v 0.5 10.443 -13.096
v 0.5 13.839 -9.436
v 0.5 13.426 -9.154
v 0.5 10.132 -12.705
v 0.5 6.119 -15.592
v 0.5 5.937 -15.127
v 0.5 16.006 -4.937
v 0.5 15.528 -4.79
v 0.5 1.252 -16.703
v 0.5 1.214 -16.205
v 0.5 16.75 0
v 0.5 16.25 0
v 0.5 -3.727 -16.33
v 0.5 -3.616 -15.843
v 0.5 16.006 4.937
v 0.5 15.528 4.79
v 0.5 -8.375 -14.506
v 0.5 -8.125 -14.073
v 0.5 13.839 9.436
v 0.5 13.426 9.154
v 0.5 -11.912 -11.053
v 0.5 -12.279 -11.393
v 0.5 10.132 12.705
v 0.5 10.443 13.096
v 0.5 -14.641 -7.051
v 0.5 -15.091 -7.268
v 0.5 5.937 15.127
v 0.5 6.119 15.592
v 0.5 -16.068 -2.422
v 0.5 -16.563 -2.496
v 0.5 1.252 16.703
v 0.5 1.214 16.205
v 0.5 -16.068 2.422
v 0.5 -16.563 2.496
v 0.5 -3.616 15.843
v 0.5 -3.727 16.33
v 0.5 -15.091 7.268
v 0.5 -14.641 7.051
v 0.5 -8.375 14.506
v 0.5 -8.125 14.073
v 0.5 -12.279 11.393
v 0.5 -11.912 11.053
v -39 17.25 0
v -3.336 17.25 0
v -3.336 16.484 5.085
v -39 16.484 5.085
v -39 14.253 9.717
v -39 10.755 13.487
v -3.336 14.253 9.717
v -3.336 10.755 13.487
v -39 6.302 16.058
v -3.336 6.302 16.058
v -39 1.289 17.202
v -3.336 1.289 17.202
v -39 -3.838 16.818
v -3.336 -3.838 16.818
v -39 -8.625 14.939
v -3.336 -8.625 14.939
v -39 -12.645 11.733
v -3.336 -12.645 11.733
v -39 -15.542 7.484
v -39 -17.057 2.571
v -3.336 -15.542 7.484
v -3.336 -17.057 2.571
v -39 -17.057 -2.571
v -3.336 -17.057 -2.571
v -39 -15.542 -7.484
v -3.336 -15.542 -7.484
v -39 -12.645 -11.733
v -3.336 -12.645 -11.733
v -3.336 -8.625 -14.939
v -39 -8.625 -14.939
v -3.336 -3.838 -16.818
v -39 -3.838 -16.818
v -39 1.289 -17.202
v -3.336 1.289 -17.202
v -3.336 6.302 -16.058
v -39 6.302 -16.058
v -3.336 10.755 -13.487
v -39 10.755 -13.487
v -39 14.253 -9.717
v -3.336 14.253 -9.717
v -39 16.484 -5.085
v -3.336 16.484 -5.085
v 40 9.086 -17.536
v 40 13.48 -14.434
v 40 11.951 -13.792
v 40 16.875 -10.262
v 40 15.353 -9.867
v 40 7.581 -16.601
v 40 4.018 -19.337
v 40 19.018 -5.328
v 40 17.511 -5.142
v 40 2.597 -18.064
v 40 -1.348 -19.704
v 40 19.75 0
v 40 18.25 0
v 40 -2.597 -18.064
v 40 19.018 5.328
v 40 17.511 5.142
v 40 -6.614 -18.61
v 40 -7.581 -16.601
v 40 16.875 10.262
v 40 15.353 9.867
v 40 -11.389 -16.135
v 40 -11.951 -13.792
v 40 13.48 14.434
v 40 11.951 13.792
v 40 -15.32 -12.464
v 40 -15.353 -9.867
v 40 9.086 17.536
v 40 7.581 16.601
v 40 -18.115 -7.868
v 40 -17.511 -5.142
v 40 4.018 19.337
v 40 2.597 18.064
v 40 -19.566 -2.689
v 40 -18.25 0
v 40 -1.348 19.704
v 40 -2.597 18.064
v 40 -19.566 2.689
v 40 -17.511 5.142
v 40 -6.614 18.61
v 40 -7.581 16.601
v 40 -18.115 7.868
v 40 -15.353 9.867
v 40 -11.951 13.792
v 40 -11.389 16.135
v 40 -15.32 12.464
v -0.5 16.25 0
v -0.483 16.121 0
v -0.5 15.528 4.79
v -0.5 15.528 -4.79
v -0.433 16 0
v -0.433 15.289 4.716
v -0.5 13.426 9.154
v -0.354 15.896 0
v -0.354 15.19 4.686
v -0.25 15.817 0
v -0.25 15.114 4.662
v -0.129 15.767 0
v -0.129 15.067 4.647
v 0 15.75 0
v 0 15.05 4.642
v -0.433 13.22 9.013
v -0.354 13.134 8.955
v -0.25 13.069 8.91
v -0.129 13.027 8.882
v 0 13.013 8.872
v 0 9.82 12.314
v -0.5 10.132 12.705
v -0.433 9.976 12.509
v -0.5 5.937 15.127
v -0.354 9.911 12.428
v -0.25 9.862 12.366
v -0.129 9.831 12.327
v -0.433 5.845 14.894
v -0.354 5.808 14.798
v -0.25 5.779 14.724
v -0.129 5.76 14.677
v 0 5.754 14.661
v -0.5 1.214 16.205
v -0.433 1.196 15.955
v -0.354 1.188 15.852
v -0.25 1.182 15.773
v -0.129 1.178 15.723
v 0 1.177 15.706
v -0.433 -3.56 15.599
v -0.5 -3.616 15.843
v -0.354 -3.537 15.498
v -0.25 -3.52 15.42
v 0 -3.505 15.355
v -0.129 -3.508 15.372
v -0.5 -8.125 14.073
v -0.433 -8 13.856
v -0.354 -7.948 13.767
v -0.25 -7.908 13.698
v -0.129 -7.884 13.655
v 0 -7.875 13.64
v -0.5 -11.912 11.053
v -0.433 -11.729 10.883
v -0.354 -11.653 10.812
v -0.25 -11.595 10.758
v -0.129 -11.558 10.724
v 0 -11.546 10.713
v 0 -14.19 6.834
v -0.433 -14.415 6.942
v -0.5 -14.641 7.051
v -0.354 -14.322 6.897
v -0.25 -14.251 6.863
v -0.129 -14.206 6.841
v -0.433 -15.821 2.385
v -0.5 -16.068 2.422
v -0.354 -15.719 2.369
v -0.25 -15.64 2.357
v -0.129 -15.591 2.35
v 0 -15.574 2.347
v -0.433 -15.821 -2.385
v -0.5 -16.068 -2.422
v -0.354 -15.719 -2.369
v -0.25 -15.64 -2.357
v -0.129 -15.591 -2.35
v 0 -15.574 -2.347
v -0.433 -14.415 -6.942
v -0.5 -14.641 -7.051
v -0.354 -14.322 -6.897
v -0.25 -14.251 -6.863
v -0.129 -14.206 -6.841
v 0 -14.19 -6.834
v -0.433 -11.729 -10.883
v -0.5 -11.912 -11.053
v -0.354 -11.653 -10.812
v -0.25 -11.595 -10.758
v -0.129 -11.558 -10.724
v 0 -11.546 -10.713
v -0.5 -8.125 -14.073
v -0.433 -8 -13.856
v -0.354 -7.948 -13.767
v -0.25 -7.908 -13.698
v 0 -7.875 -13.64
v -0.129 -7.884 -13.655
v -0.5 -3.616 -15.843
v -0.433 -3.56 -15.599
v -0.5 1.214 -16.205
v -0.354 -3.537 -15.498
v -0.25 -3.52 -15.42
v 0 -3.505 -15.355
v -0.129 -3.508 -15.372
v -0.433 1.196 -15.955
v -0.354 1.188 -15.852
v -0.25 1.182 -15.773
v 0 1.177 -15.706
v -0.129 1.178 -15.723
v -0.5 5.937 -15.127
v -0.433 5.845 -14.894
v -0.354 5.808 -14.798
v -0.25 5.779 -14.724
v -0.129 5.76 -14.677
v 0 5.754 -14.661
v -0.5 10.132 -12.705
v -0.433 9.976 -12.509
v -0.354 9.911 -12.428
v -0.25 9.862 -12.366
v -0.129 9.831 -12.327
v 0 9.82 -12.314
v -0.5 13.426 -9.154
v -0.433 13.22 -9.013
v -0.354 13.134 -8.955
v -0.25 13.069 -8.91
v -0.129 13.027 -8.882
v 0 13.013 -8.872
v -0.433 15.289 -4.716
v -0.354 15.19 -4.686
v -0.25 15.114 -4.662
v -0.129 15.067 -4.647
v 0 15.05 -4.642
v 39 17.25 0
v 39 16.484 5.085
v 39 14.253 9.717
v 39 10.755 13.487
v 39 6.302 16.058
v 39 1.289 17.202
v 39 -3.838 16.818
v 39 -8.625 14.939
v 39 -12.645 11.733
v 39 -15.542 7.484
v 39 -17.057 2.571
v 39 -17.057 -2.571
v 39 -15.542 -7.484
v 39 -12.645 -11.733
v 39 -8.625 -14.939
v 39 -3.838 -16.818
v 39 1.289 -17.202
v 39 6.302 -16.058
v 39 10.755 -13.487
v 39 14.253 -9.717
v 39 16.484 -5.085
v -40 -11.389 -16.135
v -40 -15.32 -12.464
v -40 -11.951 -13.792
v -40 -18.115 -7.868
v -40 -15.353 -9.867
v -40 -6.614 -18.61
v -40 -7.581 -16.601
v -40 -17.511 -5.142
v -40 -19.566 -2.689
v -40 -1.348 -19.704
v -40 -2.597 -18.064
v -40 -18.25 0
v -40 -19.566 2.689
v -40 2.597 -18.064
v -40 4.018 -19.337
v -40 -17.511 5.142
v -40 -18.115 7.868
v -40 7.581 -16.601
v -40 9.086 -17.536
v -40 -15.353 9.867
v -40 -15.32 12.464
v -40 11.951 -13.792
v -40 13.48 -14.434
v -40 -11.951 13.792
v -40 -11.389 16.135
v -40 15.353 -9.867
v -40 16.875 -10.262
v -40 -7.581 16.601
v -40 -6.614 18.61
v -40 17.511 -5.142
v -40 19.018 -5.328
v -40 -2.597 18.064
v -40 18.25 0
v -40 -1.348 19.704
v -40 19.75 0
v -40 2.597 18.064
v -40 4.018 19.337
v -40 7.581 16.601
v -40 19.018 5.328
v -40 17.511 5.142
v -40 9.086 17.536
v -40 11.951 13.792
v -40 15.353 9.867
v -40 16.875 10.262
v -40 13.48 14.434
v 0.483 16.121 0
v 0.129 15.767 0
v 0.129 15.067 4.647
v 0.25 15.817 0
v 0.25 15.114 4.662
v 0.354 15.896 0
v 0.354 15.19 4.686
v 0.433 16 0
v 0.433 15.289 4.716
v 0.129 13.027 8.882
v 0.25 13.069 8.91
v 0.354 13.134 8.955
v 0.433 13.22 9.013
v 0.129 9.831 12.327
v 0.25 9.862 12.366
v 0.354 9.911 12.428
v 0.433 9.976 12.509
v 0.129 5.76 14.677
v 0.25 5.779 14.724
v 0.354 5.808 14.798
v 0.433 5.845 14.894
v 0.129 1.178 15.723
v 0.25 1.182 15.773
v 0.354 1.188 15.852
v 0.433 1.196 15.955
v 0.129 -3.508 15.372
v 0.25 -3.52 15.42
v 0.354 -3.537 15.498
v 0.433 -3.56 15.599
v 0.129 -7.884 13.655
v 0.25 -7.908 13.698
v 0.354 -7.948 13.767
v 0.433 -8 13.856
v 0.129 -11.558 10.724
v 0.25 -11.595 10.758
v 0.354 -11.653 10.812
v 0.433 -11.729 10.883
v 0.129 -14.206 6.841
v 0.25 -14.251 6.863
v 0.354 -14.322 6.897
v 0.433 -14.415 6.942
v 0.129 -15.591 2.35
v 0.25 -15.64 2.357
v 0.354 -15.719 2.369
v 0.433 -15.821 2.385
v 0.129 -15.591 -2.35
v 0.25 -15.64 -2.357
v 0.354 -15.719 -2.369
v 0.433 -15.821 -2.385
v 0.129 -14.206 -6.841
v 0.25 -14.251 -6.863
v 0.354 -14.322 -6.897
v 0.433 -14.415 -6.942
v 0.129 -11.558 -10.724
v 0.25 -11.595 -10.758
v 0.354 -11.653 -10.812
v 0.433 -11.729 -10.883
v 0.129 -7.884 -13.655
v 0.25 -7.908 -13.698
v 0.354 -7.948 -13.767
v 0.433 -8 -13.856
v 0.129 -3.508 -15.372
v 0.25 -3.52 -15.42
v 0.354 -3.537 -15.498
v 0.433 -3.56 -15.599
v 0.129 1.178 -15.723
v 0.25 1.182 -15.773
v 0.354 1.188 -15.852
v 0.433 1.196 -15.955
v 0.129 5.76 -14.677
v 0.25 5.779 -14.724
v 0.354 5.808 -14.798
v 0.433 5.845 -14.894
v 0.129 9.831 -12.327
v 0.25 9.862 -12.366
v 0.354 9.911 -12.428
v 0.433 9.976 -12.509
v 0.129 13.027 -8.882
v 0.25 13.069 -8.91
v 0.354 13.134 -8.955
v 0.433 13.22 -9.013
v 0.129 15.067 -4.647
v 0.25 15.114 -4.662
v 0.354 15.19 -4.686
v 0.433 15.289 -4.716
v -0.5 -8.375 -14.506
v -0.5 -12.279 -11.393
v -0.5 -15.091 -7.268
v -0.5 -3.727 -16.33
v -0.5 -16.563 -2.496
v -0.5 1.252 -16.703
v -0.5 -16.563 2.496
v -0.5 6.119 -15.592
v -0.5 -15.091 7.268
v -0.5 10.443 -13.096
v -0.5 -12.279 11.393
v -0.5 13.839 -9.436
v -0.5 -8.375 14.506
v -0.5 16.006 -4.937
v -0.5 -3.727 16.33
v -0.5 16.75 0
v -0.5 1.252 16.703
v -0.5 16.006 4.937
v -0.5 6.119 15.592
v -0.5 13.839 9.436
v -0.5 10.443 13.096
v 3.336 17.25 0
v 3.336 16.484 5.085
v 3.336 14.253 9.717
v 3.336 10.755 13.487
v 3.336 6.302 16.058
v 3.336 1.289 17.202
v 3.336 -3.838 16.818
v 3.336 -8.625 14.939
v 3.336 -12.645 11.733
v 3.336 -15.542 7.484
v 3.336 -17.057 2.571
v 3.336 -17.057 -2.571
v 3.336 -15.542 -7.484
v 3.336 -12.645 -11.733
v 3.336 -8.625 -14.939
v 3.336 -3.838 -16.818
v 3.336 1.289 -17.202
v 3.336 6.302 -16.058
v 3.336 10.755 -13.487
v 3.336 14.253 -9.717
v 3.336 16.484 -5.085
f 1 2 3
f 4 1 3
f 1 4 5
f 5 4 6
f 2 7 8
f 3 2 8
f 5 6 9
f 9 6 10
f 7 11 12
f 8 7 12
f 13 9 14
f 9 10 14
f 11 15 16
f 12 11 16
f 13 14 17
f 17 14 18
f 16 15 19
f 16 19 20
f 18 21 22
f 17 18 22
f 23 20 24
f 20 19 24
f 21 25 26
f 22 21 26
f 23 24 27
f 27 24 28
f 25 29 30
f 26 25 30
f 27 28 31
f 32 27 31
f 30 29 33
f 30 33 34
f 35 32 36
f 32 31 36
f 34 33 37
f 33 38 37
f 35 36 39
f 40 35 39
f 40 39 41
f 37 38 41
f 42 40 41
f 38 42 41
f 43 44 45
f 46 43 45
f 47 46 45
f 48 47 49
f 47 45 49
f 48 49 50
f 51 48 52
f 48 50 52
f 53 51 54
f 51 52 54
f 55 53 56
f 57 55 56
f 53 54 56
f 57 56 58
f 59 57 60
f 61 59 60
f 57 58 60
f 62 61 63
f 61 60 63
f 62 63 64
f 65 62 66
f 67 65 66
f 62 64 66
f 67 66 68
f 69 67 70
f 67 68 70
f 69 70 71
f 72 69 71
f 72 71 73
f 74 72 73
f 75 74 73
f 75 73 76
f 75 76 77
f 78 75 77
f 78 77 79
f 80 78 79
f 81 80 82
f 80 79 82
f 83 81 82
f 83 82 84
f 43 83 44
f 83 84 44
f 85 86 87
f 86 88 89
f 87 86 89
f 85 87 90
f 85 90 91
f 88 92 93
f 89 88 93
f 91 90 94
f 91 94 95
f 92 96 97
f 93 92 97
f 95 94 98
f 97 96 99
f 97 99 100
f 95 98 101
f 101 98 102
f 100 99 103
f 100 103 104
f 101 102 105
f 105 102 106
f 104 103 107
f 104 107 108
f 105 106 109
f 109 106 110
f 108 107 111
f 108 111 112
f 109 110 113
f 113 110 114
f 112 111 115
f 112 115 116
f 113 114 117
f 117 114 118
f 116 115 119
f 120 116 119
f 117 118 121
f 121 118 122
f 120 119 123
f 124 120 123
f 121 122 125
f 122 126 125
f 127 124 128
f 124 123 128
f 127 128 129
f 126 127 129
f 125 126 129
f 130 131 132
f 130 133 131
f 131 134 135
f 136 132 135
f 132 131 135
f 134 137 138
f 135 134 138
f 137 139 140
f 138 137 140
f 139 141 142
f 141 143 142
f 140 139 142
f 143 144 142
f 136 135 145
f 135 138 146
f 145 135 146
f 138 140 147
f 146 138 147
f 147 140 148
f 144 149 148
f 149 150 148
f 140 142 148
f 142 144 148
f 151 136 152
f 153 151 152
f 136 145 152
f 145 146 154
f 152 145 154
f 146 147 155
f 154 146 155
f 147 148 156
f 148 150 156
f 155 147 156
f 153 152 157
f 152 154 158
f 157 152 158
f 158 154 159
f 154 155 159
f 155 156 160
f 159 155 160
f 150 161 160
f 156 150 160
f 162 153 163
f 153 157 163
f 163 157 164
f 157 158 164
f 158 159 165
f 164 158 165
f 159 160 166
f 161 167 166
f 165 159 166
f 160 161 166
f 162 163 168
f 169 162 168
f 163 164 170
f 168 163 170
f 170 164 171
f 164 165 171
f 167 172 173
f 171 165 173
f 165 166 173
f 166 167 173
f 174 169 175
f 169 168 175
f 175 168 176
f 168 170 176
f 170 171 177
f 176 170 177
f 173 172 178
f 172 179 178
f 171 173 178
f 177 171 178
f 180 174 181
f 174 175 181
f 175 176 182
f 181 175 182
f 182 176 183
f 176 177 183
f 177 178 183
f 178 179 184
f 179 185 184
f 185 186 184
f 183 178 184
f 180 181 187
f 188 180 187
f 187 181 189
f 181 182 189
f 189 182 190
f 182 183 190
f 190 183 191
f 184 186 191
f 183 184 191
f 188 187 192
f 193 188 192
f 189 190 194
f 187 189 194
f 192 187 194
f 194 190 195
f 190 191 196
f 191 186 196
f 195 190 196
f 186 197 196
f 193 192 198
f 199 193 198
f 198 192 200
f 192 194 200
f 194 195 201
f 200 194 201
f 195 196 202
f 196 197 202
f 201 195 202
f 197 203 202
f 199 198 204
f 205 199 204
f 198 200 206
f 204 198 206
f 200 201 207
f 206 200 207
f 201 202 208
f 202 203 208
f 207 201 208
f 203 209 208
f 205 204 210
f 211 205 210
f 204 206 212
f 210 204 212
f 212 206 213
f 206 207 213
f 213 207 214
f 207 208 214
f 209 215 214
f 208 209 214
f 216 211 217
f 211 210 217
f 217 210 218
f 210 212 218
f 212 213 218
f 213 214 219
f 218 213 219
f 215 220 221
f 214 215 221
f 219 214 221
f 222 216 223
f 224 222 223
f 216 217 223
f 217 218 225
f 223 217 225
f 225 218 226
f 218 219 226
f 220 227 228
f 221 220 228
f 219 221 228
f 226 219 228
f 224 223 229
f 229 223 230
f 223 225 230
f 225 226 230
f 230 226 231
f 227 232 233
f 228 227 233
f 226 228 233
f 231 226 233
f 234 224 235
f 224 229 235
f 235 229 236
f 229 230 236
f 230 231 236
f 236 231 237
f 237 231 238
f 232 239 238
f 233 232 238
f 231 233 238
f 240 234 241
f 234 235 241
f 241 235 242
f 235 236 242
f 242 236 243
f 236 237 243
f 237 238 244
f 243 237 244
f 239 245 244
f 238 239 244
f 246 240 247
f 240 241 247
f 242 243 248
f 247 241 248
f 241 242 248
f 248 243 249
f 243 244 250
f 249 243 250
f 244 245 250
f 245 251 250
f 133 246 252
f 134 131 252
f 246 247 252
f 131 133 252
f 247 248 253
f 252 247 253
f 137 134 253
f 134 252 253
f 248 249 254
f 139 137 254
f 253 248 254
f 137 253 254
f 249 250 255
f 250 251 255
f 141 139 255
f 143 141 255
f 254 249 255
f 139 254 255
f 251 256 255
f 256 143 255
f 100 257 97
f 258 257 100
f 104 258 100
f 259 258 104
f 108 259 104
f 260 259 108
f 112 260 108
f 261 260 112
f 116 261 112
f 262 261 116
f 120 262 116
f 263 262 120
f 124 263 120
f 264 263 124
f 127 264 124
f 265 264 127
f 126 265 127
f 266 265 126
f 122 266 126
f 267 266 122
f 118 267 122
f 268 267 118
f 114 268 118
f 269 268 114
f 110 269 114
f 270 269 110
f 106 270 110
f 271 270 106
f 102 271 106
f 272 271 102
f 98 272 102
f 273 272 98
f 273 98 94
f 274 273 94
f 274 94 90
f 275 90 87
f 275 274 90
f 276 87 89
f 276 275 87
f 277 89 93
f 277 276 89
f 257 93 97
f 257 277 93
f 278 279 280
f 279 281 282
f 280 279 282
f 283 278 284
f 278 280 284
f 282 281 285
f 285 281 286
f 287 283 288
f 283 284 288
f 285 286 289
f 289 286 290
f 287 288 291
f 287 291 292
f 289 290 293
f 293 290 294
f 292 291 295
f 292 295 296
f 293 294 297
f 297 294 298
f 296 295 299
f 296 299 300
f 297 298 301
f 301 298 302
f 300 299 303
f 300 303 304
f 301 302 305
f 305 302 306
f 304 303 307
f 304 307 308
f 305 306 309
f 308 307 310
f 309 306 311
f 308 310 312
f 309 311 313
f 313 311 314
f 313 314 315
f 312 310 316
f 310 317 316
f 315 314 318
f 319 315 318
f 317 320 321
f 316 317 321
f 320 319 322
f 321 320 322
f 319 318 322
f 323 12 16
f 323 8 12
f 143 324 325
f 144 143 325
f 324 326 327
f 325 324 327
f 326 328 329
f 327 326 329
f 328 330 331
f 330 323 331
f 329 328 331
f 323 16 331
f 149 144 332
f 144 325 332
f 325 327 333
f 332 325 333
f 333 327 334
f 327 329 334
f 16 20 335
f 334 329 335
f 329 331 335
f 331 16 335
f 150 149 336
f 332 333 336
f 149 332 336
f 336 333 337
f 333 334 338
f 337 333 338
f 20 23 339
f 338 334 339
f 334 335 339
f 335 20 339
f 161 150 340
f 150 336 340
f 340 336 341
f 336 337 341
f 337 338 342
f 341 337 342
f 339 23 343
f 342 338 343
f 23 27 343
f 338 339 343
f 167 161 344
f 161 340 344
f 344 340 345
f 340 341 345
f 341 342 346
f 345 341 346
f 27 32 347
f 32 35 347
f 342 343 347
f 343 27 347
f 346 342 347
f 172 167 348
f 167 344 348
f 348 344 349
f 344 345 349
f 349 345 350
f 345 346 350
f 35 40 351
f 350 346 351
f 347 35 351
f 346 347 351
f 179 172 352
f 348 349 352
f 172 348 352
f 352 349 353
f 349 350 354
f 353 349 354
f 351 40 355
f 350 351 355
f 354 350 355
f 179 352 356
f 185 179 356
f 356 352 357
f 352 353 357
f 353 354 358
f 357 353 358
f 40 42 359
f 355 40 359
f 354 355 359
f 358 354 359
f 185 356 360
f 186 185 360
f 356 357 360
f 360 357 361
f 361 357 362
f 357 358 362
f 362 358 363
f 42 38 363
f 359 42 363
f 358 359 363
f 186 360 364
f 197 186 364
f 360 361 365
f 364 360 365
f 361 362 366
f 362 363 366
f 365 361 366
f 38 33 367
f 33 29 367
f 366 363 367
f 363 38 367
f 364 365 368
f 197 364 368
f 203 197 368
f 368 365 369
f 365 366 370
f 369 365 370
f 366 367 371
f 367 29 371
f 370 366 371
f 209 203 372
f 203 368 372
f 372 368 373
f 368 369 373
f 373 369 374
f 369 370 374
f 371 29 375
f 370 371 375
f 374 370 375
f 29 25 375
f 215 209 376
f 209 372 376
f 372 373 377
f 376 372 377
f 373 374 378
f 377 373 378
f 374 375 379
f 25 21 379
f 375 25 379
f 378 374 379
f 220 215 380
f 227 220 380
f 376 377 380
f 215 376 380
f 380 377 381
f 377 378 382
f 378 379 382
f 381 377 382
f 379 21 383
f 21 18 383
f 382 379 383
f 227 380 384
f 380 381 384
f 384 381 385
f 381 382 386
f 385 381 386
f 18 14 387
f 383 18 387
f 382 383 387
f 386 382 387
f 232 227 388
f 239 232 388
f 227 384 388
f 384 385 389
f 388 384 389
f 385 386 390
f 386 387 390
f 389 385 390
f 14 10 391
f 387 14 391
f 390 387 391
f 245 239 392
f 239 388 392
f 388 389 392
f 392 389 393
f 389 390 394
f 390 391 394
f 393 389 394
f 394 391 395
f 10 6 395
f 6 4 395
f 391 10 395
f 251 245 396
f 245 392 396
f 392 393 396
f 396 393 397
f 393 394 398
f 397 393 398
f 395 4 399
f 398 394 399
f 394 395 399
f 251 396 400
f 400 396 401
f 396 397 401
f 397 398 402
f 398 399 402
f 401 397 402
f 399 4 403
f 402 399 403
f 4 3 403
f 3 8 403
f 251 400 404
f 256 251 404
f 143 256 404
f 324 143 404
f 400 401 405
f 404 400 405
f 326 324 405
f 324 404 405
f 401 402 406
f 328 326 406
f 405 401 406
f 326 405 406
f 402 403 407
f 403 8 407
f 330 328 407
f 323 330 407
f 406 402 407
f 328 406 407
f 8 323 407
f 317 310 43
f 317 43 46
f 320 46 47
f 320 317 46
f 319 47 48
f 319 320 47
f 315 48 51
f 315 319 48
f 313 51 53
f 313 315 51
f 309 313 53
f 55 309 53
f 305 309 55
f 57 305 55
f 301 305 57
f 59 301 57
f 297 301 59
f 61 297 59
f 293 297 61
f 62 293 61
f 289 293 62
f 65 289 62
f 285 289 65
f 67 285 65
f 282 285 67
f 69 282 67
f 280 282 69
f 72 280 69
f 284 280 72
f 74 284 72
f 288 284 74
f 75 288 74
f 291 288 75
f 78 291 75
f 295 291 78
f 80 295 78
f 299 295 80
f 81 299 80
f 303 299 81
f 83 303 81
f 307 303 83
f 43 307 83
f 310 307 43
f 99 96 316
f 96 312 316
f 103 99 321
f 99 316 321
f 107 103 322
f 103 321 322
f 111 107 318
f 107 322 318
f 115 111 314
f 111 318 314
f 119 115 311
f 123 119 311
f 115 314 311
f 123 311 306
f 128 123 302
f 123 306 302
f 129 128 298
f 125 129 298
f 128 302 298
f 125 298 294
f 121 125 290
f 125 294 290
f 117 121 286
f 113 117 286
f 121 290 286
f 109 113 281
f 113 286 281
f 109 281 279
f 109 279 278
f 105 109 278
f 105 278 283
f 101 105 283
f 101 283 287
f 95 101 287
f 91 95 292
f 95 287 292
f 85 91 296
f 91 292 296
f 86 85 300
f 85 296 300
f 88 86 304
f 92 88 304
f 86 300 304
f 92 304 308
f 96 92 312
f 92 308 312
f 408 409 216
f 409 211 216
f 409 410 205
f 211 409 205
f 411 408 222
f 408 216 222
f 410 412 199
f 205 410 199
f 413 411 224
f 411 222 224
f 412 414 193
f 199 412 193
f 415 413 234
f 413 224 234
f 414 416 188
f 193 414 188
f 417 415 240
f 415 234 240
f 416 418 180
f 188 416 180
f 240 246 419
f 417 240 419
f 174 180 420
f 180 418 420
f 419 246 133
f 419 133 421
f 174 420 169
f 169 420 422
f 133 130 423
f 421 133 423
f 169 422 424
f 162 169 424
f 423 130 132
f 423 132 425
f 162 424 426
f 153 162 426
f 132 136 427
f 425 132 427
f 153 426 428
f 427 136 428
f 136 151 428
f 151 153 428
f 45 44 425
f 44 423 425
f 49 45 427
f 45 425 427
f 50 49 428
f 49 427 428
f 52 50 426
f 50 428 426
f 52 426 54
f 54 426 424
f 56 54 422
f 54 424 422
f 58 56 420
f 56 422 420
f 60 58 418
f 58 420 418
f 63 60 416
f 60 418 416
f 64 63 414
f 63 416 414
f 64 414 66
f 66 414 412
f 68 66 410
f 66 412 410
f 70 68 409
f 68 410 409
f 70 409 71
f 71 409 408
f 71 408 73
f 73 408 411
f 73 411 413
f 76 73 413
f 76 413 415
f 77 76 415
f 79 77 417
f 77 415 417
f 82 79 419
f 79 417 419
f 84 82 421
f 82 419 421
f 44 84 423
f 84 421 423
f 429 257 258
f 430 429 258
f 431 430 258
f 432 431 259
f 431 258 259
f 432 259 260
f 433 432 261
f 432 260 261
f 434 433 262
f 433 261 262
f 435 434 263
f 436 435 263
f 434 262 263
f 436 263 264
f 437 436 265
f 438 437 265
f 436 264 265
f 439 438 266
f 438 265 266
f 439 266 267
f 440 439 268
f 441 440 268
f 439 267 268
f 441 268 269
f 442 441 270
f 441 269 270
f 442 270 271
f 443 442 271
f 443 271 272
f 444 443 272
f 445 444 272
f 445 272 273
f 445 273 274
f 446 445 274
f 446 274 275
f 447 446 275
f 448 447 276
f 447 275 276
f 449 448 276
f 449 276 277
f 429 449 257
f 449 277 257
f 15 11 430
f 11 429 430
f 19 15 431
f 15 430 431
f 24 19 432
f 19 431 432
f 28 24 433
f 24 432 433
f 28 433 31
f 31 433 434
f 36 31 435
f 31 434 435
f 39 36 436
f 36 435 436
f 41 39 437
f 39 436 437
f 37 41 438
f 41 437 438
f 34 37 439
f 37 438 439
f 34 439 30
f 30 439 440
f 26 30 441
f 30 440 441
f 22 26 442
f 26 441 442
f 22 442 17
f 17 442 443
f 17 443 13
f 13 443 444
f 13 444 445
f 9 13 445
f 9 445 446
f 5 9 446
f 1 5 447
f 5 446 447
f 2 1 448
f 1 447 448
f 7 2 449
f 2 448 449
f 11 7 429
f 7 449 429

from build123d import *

# Parameters (mm, degrees)
F2_R    = 0.49999
F3_SIZE = 1


# Not quite as in the source:
# - a fillet or chamfer is up to 0.001 mm smaller than in the source, because OpenCascade refuses the exact size


with BuildPart() as f1:
    # F0 (on Top) → F1 (revolve)
    with BuildSketch(Plane.XY):
        Polygon((0, 19.75), (-40, 19.75), (-40, 17.25), (-3.3356409098, 17.25), (-0.5, 16.75), (-0.5, 15.75), (0, 15.75), (0.5, 15.75), (0.5, 16.75), (3.3356409098, 17.25), (40, 17.25), (40, 19.75), align=None)
    revolve(axis=Axis((0, 0, 0), (1, 0, 0)))

    # F2 (radius 0.5 in the source; OpenCascade refuses exactly that, so slightly less here)
    f2_edges = [f1.edges().sort_by_distance(p)[0] for p in [
        (-0.5, -15.75, 0),
        (0.5, -15.75, 0),
    ]]
    fillet(f2_edges, radius=F2_R)

    # F3
    f3_edges = [f1.edges().sort_by_distance(p)[0] for p in [
        (-40, -17.25, 0),
        (40, -17.25, 0),
    ]]
    chamfer(f3_edges, length=F3_SIZE)


solid = f1.part
